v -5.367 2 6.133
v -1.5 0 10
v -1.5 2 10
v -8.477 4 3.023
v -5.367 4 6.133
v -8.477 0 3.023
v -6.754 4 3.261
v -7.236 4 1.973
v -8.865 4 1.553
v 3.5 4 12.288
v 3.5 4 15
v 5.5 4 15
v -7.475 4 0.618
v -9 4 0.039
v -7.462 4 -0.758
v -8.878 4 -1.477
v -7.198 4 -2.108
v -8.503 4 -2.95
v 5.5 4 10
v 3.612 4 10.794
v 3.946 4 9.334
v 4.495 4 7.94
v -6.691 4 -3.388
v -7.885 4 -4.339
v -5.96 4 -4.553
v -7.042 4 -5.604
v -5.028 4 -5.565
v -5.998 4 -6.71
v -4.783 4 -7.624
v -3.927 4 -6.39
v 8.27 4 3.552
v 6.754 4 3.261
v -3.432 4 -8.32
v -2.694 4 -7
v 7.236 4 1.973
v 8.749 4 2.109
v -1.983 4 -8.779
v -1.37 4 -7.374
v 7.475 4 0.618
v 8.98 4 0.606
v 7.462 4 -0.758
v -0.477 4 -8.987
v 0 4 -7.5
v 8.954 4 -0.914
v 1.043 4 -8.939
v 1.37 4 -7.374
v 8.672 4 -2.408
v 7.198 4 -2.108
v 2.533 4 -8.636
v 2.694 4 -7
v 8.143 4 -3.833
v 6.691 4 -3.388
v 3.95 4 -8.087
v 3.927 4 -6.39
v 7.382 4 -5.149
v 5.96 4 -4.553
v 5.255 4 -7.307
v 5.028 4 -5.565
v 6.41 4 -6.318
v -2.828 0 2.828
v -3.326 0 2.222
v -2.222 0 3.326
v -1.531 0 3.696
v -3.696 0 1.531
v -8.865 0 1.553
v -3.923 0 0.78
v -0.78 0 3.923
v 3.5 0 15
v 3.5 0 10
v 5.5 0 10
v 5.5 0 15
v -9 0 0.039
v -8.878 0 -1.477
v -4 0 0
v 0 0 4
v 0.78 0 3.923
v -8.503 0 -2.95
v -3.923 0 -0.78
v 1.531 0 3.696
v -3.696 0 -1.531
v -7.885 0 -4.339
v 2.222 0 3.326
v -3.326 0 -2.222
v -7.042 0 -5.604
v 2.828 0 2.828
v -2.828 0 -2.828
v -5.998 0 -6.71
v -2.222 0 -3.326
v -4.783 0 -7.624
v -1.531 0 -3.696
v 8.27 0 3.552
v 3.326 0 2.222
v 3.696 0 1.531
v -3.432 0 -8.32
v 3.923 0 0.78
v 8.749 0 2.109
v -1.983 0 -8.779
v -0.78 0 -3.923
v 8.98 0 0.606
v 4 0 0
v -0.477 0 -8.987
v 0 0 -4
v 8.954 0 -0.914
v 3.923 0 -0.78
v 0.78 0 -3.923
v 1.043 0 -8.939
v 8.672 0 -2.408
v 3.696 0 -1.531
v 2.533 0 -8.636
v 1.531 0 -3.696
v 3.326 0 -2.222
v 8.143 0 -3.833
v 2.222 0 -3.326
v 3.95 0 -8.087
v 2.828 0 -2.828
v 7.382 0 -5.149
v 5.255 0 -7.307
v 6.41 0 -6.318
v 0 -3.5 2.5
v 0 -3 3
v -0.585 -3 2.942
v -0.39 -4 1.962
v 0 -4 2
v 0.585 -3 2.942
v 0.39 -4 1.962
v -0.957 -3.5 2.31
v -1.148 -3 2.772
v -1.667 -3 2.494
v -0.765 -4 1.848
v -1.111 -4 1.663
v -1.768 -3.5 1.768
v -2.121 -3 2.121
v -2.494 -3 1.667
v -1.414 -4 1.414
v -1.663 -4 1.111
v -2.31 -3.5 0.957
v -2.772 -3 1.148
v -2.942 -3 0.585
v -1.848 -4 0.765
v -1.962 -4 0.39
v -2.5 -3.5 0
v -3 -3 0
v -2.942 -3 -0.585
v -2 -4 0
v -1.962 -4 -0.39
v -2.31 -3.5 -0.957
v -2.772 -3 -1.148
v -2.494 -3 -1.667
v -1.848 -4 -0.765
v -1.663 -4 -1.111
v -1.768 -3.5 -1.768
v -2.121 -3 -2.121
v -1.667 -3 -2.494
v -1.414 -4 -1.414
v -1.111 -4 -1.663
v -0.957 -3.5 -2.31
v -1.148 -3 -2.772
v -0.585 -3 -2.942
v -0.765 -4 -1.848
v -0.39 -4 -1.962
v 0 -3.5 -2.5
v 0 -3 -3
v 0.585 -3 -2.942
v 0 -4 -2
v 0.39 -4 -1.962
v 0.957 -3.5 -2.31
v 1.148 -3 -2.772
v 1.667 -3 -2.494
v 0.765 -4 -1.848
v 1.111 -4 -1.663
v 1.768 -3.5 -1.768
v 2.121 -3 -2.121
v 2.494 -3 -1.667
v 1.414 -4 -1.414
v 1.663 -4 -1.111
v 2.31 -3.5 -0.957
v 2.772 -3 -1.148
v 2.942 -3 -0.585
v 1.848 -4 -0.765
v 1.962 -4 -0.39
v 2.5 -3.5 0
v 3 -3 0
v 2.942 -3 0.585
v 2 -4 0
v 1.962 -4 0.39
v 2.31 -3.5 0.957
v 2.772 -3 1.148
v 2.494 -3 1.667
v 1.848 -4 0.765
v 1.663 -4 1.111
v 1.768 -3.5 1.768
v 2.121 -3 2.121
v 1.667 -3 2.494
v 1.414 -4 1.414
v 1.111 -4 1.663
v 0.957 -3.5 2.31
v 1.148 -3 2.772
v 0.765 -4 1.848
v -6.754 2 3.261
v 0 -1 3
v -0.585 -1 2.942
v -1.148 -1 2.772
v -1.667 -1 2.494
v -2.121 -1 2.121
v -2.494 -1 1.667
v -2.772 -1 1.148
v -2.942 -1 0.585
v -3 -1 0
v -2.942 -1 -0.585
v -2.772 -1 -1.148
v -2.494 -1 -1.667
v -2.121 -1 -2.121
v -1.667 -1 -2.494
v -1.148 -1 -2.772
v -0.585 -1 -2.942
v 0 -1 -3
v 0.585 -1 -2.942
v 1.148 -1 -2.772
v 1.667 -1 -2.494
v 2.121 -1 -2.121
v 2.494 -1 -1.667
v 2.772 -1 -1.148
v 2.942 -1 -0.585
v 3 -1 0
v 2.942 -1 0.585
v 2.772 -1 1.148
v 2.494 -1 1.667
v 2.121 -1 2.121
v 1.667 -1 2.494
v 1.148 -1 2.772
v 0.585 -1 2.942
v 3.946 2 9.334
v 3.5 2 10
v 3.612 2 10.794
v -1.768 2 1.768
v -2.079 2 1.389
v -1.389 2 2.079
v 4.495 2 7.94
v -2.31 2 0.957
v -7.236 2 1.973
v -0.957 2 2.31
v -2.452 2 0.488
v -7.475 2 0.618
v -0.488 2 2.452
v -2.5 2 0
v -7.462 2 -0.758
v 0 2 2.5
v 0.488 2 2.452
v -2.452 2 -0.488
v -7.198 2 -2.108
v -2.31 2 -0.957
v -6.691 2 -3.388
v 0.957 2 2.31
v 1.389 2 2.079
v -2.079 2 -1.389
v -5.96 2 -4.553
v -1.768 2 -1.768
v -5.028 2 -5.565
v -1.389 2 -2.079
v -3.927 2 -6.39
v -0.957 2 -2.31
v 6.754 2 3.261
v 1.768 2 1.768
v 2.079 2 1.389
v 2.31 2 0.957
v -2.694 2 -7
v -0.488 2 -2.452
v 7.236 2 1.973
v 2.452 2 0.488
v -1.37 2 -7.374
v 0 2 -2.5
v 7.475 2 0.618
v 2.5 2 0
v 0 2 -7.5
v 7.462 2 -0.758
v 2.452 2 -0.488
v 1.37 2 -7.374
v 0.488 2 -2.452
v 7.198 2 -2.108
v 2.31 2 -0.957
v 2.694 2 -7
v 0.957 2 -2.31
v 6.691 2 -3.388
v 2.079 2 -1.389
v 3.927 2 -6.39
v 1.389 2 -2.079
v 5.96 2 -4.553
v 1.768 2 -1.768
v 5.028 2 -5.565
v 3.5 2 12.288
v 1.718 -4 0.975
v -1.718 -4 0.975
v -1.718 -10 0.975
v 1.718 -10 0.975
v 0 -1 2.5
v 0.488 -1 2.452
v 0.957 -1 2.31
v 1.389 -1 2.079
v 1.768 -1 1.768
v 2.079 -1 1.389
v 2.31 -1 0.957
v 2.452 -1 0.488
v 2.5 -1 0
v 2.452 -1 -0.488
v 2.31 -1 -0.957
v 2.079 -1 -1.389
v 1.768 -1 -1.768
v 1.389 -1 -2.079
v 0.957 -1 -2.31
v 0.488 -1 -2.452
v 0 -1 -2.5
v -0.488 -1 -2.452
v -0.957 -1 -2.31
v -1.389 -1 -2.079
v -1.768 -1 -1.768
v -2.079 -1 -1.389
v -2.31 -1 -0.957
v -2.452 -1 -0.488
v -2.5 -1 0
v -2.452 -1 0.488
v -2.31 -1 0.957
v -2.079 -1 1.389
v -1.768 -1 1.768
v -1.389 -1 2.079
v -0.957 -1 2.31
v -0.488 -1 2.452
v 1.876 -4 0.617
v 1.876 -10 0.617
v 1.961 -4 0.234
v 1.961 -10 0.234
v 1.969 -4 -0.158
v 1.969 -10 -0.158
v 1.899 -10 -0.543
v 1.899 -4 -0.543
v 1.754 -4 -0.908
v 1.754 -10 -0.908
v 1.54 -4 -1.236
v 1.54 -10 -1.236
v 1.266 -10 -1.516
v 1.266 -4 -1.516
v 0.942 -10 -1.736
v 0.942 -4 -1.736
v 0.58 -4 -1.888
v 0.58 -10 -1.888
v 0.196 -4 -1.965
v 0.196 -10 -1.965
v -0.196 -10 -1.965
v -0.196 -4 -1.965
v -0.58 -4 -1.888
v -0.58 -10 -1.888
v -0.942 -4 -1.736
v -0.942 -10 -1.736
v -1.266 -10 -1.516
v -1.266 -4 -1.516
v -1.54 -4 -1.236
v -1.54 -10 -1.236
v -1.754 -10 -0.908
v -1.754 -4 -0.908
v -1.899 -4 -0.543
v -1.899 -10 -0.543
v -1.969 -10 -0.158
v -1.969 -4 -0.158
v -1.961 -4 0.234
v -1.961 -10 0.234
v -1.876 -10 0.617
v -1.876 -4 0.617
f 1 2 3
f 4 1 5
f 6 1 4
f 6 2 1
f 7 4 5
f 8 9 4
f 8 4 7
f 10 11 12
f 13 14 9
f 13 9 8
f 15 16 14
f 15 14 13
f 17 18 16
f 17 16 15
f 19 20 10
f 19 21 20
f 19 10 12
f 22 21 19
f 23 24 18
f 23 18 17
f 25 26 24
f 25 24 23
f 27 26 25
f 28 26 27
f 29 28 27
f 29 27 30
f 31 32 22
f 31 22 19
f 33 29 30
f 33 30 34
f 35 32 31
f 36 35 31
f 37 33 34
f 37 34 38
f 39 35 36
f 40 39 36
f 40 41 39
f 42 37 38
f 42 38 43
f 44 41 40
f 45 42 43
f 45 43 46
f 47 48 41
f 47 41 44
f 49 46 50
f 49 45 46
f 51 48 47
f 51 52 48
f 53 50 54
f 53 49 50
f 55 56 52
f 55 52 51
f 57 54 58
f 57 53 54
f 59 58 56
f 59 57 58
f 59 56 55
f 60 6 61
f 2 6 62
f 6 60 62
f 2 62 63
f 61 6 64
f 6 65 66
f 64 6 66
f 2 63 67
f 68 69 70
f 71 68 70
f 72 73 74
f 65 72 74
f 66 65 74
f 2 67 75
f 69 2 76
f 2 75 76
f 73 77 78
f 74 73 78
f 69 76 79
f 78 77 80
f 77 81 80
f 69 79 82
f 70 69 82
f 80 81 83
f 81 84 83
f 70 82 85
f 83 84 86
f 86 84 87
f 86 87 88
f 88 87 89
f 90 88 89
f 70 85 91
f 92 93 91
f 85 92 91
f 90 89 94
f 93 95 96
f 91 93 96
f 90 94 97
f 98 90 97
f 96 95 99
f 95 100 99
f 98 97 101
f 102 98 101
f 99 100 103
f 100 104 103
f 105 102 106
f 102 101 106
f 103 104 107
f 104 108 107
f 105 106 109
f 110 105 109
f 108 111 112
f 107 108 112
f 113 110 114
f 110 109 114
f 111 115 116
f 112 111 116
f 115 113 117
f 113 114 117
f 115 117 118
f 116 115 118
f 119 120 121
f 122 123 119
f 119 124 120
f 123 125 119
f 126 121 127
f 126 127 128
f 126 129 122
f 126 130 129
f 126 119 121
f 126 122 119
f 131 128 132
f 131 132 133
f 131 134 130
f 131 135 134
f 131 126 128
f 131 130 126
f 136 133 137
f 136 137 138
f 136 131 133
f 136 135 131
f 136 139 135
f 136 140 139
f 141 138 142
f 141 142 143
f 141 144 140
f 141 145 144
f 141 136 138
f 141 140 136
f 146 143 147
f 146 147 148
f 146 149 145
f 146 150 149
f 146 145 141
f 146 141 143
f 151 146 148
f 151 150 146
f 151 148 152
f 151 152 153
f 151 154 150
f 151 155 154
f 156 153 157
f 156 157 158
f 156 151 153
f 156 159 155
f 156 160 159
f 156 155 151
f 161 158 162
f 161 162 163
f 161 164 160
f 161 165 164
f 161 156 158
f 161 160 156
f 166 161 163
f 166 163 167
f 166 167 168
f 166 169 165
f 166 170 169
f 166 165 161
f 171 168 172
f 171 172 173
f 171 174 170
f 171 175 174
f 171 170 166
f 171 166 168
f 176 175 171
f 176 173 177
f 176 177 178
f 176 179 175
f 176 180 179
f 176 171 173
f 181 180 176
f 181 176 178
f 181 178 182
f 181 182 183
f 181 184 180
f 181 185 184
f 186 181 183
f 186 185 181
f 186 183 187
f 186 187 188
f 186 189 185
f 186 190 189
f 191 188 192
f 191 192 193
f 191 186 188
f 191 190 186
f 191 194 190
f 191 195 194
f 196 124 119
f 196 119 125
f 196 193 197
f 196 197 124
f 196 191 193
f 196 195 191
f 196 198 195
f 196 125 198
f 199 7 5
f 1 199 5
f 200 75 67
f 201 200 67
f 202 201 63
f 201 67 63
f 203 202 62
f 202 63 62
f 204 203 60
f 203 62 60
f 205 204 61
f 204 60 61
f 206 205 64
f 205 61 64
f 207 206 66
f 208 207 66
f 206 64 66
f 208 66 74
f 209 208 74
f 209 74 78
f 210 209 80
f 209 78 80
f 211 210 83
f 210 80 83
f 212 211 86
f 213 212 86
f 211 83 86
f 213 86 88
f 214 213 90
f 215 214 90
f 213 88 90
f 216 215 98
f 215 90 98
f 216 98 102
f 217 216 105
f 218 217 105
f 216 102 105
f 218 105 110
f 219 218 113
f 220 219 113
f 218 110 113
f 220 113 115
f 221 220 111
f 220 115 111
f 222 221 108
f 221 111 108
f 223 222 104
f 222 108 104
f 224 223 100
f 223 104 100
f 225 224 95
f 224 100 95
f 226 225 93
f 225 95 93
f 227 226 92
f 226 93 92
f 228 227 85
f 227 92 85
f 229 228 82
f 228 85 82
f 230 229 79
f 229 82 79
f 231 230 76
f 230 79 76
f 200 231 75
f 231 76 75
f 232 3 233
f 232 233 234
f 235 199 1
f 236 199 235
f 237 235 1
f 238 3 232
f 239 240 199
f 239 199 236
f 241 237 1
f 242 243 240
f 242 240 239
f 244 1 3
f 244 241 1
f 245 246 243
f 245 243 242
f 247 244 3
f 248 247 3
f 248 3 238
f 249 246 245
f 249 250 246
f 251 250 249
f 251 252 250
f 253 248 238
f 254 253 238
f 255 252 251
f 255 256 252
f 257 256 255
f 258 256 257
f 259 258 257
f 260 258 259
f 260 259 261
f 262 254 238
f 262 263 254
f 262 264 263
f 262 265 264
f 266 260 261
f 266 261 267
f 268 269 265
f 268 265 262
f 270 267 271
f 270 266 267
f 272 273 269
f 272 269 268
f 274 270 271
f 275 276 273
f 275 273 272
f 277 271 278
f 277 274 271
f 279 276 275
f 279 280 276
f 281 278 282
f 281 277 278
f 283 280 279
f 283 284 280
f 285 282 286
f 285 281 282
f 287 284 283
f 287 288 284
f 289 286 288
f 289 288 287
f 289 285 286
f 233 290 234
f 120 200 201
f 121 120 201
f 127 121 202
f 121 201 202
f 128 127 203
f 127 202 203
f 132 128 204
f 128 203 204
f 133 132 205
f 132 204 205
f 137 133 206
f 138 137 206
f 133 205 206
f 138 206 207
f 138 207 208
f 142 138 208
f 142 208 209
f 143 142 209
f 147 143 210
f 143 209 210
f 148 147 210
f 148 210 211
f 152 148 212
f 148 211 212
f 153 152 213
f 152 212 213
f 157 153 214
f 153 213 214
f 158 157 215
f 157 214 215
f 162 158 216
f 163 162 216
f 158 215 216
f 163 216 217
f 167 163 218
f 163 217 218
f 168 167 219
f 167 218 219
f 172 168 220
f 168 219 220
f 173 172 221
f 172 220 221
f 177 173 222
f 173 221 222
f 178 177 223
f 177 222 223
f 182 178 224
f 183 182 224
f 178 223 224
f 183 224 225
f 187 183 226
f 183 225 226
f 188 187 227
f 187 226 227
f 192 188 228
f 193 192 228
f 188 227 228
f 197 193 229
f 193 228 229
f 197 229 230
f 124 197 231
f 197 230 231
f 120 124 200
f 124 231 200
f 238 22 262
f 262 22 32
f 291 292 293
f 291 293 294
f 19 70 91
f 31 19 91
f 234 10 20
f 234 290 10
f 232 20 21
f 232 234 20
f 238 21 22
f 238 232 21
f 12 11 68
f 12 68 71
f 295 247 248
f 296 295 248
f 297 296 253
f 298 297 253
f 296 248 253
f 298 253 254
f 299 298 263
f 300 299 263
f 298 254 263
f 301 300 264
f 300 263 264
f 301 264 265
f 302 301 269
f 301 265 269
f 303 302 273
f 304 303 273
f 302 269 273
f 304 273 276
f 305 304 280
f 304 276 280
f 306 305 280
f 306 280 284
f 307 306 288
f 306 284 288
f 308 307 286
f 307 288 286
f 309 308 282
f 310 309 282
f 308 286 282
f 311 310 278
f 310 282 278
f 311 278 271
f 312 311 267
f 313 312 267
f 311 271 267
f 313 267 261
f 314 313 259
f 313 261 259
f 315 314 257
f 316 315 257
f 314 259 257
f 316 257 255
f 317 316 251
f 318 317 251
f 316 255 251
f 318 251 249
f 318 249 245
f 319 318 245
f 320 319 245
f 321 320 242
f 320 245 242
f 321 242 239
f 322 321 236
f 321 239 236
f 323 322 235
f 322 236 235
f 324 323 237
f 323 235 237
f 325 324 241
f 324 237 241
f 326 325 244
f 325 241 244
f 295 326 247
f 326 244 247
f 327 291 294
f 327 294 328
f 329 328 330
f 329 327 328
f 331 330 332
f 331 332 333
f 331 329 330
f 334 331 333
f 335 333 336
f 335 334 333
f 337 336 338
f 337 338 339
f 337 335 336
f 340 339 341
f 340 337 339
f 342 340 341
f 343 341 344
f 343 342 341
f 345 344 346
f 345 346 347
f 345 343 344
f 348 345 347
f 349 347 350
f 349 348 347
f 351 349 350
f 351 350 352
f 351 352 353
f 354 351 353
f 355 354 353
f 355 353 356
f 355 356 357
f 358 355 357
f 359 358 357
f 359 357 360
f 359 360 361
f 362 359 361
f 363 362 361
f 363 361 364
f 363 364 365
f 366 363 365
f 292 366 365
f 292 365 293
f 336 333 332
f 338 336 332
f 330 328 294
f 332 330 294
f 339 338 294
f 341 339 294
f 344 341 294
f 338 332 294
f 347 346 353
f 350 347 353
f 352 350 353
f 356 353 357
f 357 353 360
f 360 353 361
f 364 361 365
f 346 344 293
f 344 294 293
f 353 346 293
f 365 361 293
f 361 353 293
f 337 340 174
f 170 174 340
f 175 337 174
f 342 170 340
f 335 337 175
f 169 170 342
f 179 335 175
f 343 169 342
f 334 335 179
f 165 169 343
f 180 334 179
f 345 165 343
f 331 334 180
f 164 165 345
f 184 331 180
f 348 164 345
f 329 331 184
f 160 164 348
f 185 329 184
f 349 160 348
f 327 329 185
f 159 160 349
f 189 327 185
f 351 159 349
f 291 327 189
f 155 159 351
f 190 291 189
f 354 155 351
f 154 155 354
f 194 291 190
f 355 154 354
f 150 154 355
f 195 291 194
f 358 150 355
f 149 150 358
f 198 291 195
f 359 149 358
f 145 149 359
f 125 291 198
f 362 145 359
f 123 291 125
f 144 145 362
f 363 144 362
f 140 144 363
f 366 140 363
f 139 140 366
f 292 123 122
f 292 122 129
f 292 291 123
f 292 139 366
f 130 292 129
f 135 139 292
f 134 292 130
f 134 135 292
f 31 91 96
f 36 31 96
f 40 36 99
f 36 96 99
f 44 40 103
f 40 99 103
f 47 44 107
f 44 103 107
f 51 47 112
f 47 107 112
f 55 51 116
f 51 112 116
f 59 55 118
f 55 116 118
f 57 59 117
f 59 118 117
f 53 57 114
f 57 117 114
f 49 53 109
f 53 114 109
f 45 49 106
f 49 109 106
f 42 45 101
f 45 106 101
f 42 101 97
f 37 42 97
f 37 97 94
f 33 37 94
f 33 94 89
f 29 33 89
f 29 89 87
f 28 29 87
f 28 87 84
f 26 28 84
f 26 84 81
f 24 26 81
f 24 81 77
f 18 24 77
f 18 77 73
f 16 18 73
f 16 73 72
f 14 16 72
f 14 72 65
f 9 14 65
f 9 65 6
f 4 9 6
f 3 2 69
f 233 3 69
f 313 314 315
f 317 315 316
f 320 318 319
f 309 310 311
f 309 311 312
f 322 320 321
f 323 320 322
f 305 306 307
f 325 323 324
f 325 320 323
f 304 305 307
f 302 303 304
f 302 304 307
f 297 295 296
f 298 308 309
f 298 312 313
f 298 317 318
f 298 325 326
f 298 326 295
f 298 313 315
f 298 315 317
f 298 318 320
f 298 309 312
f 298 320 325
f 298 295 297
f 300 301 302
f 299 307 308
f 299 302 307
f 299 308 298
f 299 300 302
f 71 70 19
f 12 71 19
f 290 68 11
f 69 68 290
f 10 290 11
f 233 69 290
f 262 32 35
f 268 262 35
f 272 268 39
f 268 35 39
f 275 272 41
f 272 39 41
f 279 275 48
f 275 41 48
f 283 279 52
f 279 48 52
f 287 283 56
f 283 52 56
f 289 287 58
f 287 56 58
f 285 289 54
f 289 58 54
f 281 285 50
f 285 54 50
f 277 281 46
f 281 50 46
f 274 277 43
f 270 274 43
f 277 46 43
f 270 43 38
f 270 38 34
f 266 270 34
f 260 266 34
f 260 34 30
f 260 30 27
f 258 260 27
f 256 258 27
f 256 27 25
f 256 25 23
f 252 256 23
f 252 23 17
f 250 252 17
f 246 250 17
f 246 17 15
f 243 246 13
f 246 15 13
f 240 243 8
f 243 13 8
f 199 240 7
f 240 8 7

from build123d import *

# Parameters (mm, degrees)
BOSS_EXTRUDE1_DEPTH = 4
CUT_EXTRUDE1_DEPTH  = 2
BOSS_EXTRUDE2_DEPTH = 10
SKETCH4_R           = 3
BOSS_EXTRUDE3_DEPTH = 4
SKETCH5_R           = 2.5
CUT_EXTRUDE2_DEPTH  = 3
CHAMFER1_SIZE       = 1
SKETCH6_W           = 2
SKETCH6_H           = 4
BOSS_EXTRUDE4_DEPTH = 5
FILLET1_R           = 10
CUT_EXTRUDE3_DEPTH  = 10


with BuildPart() as part:
    # Sketch1 → Boss-Extrude1 (new body)
    with BuildSketch(Plane(origin=(0, 0, 0), x_dir=(1, 0, 0), z_dir=(0, 1, 0))):
        with BuildLine():
            Line((-8.269520907, -3.551763501), (-5.5, -10))
            Line((-5.5, -10), (5.5, -10))
            Line((5.5, -10), (8.269520907, -3.551763501))
            ThreePointArc((8.269520907, -3.551763501), (0, 9), (-8.269520907, -3.551763501))
        make_face()
    extrude(amount=BOSS_EXTRUDE1_DEPTH)

    # Sketch2 → Cut-Extrude1 (cut)
    with BuildSketch(Plane(origin=(0, 4, 0), x_dir=(1, 0, 0), z_dir=(0, 1, 0))):
        with BuildLine():
            Line((-6.753885149, -3.261140198), (-3.5, -10))
            Line((-3.5, -10), (3.5, -10))
            Line((3.5, -10), (6.753885149, -3.261140198))
            ThreePointArc((6.753885149, -3.261140198), (0, 7.5), (-6.753885149, -3.261140198))
        make_face()
    extrude(amount=-CUT_EXTRUDE1_DEPTH, mode=Mode.SUBTRACT)

    # Sketch3 → Boss-Extrude2 (add)
    with BuildSketch(Plane.XZ):
        with BuildLine():
            Line((-1.717556404, 0.975), (1.717556404, 0.975))
            ThreePointArc((1.717556404, 0.975), (0, -1.975), (-1.717556404, 0.975))
        make_face()
    extrude(amount=BOSS_EXTRUDE2_DEPTH)

    # Sketch4 → Boss-Extrude3 (add)
    with BuildSketch(Plane.XZ):
        with Locations(Location((0, 0, 0), (0, 0, 90))):
            Circle(SKETCH4_R)
    extrude(amount=BOSS_EXTRUDE3_DEPTH)

    # Sketch5 → Cut-Extrude2 (cut)
    with BuildSketch(Plane(origin=(0, 2, 0), x_dir=(1, 0, 0), z_dir=(0, 1, 0))):
        with Locations(Location((0, 0, 0), (0, 0, 270))):
            Circle(SKETCH5_R)
    extrude(amount=-CUT_EXTRUDE2_DEPTH, mode=Mode.SUBTRACT)

    # Chamfer1
    chamfer1_edges = [part.edges().sort_by_distance(p)[0] for p in [
        (0, 0, -3),
        (0, -4, -3),
    ]]
    chamfer(chamfer1_edges, length=CHAMFER1_SIZE)

    # Sketch6 → Boss-Extrude4 (add)
    with BuildSketch(Plane.XY.offset(10)):
        with Locations((4.5, 2)):
            Rectangle(SKETCH6_W, SKETCH6_H)
    extrude(amount=BOSS_EXTRUDE4_DEPTH)

    # Fillet1
    fillet1_edges = [part.edges().sort_by_distance(p)[0] for p in [
        (3.5, 3, 10),
    ]]
    fillet(fillet1_edges, radius=FILLET1_R)

    # Sketch8 → Cut-Extrude3 (cut)
    with BuildSketch(Plane.XZ):
        Polygon((-5.5, 10), (-1.5, 10), (-8.511399863, 2.988600137), align=None)
    extrude(amount=-CUT_EXTRUDE3_DEPTH, mode=Mode.SUBTRACT)


solid = part.part
